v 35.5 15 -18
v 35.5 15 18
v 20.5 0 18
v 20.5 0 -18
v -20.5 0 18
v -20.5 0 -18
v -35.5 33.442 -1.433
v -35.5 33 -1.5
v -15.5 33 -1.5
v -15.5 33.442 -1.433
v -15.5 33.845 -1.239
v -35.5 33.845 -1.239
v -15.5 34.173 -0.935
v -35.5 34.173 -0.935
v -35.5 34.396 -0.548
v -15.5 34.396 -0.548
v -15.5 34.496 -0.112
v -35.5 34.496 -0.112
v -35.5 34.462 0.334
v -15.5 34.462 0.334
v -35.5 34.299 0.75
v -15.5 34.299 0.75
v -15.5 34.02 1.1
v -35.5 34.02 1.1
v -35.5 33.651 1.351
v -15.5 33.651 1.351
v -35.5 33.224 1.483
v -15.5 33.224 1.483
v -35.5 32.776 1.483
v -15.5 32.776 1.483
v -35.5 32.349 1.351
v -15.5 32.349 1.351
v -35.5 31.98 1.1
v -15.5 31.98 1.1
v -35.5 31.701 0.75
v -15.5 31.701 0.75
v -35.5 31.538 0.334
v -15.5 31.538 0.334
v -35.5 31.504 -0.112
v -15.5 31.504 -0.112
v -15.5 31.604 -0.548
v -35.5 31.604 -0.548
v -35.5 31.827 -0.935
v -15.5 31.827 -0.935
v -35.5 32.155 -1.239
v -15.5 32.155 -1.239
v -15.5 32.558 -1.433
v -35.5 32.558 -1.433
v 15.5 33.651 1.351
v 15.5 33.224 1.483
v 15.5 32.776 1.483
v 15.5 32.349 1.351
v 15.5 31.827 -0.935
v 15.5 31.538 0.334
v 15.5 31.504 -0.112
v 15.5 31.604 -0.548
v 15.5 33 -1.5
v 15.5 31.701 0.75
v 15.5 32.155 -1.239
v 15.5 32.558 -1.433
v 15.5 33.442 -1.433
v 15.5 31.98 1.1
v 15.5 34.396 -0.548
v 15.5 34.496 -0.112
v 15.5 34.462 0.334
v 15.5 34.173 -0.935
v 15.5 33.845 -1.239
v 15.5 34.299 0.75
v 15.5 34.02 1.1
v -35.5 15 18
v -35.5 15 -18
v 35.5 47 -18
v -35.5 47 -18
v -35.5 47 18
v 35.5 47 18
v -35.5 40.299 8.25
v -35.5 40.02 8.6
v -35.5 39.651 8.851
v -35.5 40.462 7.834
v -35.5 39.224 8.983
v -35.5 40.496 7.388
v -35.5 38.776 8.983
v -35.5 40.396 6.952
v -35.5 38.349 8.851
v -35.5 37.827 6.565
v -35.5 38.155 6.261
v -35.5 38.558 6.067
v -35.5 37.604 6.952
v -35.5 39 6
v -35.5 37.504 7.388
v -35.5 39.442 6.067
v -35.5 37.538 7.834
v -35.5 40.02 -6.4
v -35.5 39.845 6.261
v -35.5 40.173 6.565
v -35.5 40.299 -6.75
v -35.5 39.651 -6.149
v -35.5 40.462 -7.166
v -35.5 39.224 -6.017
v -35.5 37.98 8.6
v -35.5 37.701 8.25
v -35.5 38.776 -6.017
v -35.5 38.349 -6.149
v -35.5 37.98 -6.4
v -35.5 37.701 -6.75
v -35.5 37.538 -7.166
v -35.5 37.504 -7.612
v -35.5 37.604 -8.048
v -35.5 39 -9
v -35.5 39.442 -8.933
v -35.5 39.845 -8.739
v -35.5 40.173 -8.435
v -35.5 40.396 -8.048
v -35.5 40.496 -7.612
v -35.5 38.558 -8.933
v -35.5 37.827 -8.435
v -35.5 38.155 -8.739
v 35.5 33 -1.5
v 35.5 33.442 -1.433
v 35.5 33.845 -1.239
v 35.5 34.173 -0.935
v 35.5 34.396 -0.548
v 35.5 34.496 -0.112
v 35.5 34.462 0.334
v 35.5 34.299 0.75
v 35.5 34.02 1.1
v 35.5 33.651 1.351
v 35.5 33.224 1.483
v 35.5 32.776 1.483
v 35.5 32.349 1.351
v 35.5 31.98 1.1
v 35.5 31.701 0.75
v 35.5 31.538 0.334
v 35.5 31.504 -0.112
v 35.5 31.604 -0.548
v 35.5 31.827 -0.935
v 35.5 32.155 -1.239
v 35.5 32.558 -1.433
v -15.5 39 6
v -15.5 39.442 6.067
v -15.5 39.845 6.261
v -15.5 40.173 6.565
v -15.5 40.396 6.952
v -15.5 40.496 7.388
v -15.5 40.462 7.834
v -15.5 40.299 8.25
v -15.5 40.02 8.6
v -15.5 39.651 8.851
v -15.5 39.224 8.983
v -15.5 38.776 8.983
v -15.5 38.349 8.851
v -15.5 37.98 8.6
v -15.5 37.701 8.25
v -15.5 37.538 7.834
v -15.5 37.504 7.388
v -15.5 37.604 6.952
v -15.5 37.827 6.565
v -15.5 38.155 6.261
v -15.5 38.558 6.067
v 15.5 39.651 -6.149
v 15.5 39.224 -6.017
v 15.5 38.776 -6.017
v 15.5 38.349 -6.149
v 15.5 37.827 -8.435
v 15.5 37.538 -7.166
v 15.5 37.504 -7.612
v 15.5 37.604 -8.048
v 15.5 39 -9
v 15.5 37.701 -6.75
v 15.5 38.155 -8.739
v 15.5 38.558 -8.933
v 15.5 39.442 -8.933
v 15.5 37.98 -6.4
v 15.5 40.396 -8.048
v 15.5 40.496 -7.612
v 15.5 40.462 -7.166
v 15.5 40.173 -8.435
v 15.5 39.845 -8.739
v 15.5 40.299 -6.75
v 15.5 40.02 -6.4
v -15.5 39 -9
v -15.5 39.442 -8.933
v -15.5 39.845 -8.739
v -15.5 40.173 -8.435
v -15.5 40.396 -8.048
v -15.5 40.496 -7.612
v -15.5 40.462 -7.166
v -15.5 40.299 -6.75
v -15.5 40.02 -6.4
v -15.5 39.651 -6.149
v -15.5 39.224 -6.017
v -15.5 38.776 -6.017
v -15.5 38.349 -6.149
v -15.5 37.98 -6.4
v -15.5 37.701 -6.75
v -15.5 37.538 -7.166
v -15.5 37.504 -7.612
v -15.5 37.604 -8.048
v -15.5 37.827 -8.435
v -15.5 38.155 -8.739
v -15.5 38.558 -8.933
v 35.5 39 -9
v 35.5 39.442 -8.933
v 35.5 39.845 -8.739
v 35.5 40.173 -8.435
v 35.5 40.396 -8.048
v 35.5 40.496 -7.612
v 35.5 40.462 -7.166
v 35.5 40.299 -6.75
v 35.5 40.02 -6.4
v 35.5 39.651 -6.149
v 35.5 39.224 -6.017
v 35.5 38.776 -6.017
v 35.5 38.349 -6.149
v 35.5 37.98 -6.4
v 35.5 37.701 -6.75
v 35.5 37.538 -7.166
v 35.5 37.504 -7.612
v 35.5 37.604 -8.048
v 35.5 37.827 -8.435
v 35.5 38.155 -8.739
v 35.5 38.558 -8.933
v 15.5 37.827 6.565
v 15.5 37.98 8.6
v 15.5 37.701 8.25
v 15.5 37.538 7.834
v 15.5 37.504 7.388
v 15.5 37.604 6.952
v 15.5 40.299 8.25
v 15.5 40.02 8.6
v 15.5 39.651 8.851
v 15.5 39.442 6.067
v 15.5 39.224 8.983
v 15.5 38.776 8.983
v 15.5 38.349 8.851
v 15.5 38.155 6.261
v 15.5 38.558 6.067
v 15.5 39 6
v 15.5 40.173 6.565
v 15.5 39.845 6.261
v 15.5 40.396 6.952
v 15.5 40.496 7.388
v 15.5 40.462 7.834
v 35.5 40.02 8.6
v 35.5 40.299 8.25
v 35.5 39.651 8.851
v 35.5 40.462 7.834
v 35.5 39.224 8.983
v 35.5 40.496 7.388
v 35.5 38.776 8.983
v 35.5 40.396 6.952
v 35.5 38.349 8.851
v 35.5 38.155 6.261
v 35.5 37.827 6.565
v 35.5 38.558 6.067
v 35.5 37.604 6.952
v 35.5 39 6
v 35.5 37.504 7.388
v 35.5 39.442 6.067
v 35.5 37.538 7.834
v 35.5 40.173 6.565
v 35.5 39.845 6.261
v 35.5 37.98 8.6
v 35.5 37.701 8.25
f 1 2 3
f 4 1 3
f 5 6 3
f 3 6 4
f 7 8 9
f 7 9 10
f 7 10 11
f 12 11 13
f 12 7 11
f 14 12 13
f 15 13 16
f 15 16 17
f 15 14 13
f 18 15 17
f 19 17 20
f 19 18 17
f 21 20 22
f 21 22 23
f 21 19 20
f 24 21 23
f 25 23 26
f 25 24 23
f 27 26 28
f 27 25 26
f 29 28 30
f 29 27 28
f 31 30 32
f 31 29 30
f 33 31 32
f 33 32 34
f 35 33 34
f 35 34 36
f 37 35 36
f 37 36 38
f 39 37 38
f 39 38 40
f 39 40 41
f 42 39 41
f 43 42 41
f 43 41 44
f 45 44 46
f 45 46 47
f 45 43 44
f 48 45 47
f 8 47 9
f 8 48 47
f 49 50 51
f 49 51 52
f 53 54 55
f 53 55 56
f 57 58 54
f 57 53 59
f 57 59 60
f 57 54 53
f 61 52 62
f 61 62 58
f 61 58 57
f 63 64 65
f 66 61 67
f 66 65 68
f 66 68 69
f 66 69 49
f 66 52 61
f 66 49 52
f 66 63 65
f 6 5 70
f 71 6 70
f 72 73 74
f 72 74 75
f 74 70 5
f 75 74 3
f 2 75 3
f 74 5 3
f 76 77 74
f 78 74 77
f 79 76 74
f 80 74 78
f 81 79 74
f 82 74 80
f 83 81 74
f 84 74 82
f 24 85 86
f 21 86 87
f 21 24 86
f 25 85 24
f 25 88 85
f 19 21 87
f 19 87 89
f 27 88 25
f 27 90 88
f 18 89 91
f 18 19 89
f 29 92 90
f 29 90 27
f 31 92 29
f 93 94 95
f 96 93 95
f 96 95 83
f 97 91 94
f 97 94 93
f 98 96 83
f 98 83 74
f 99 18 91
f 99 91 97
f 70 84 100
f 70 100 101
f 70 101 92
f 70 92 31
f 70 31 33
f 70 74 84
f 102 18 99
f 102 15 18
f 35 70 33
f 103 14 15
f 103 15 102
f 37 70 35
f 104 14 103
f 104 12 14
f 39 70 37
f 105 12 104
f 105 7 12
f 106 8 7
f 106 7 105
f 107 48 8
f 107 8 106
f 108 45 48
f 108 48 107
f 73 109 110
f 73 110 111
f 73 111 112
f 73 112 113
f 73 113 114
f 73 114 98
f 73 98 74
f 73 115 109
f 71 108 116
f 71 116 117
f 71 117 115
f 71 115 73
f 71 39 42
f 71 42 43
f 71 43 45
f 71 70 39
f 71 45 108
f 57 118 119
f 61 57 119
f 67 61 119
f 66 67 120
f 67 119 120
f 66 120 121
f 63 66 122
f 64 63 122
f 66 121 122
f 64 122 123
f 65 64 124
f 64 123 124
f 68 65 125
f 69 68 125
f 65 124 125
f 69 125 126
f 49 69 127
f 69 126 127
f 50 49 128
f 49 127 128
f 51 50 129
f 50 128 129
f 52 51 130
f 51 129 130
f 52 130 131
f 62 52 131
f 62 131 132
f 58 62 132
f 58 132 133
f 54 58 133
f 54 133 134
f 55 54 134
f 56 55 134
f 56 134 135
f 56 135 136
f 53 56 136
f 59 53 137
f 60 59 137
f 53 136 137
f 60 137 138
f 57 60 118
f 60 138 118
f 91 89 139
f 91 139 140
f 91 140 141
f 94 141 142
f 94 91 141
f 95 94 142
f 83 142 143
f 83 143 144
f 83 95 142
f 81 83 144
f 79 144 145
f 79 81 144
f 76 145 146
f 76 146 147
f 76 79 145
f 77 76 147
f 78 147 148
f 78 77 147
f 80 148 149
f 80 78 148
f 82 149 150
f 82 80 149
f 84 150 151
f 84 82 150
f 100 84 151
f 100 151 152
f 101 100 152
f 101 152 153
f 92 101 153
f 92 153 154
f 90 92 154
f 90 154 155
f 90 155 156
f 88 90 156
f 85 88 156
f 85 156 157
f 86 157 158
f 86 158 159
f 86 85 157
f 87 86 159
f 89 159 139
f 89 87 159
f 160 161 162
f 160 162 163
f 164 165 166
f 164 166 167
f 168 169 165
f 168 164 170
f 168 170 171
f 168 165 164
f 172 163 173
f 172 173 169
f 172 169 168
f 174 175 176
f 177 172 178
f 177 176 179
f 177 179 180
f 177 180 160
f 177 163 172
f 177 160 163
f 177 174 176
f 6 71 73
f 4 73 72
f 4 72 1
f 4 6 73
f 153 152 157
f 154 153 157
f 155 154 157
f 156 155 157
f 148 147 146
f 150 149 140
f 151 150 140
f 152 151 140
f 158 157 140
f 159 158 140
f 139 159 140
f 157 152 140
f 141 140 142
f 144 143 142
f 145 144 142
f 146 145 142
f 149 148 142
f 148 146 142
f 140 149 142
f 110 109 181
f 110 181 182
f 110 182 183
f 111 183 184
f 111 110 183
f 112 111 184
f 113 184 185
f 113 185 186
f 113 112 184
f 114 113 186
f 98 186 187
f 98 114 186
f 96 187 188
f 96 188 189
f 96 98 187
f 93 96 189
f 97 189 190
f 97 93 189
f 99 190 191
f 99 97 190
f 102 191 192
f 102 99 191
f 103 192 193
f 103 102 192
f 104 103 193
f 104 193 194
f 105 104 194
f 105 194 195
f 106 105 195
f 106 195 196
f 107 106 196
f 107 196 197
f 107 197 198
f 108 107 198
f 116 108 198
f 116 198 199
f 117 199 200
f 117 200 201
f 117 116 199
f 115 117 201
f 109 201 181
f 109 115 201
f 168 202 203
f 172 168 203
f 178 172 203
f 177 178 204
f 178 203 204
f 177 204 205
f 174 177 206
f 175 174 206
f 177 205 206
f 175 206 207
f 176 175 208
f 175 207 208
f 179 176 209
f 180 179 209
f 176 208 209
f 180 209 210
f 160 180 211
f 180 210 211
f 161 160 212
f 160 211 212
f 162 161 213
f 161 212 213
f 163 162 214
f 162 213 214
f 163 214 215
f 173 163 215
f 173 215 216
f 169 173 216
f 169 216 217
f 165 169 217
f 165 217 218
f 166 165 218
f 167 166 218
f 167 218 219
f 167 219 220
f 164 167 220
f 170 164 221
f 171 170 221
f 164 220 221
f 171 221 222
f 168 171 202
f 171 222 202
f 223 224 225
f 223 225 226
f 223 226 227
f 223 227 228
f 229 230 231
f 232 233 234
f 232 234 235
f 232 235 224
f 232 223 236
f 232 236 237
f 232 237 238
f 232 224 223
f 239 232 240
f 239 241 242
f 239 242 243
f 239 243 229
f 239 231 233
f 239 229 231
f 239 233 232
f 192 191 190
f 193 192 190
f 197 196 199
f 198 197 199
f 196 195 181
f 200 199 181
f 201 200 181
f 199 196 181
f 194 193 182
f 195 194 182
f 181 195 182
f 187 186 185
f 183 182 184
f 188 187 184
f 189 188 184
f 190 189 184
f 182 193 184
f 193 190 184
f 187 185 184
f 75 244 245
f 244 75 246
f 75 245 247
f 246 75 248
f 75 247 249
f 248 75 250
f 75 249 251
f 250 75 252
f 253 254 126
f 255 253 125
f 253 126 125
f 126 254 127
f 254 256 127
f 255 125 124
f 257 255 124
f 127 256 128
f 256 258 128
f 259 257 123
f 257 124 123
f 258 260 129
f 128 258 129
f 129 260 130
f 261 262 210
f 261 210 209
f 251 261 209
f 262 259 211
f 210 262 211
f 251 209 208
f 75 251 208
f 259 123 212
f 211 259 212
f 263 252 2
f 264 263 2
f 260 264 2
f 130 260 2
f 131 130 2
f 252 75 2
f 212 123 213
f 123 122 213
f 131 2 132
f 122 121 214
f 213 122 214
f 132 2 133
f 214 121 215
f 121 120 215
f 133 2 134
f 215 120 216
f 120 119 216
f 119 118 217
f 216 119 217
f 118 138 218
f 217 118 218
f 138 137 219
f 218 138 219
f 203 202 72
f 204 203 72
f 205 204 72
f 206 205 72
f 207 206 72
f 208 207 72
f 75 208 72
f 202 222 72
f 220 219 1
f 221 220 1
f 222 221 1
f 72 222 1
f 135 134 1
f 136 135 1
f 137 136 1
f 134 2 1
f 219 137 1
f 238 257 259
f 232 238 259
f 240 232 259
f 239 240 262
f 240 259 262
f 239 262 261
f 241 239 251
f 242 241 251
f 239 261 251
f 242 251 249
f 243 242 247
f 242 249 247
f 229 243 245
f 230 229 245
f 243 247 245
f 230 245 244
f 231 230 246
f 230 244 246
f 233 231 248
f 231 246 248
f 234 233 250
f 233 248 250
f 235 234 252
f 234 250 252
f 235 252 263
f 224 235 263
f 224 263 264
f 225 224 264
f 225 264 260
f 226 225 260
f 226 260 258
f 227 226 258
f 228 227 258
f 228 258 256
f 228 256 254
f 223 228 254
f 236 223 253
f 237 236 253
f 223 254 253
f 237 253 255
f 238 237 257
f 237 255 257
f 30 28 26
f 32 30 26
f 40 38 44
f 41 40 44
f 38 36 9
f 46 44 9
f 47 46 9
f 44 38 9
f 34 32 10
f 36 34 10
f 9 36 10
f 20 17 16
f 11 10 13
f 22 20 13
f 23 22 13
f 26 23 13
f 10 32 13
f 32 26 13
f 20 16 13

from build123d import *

# Parameters (mm, degrees)
SKETCH_1_W          = 71
SKETCH_1_H          = 36
EXTRUDE_1_DEPTH     = 47
CUT_EXTRUDE_1_DEPTH = 37
SKETCH_3_R          = 1.5
CUT_EXTRUDE_2_DEPTH = 20


with BuildPart() as part:
    # Эскиз1 → Бобышка-Вытянуть1 (new body)
    with BuildSketch(Plane(origin=(0, 0, 0), x_dir=(1, 0, 0), z_dir=(0, 1, 0))):
        Rectangle(SKETCH_1_W, SKETCH_1_H)
    extrude(amount=EXTRUDE_1_DEPTH)

    # Эскиз2 → Вырез-Вытянуть1 (cut, through all)
    with BuildSketch(Plane.XY.offset(18)):
        Polygon((-20.5, 0), (-35.5, 15), (-35.5, 0), align=None)
        Polygon((35.5, 15), (20.5, 0), (35.5, 0), align=None)
    extrude(amount=-CUT_EXTRUDE_1_DEPTH, mode=Mode.SUBTRACT)

    # Эскиз3 → Вырез-Вытянуть2 (cut)
    with BuildSketch(Plane(origin=(35.5, 0, 0), x_dir=(0, 0, -1), z_dir=(1, 0, 0))):
        with Locations((-7.5, 39)):
            Circle(SKETCH_3_R)
        with Locations((7.5, 39)):
            Circle(SKETCH_3_R)
        with Locations((0, 33)):
            Circle(SKETCH_3_R)
    cut_extrude_2 = extrude(amount=-CUT_EXTRUDE_2_DEPTH, mode=Mode.SUBTRACT)

    # Зеркальное отражение1: Вырез-Вытянуть2 across plane
    add(cut_extrude_2.mirror(Plane(origin=(0, 0, 0), x_dir=(0, 0, 1), z_dir=(1, 0, 0))), mode=Mode.SUBTRACT)


solid = part.part
